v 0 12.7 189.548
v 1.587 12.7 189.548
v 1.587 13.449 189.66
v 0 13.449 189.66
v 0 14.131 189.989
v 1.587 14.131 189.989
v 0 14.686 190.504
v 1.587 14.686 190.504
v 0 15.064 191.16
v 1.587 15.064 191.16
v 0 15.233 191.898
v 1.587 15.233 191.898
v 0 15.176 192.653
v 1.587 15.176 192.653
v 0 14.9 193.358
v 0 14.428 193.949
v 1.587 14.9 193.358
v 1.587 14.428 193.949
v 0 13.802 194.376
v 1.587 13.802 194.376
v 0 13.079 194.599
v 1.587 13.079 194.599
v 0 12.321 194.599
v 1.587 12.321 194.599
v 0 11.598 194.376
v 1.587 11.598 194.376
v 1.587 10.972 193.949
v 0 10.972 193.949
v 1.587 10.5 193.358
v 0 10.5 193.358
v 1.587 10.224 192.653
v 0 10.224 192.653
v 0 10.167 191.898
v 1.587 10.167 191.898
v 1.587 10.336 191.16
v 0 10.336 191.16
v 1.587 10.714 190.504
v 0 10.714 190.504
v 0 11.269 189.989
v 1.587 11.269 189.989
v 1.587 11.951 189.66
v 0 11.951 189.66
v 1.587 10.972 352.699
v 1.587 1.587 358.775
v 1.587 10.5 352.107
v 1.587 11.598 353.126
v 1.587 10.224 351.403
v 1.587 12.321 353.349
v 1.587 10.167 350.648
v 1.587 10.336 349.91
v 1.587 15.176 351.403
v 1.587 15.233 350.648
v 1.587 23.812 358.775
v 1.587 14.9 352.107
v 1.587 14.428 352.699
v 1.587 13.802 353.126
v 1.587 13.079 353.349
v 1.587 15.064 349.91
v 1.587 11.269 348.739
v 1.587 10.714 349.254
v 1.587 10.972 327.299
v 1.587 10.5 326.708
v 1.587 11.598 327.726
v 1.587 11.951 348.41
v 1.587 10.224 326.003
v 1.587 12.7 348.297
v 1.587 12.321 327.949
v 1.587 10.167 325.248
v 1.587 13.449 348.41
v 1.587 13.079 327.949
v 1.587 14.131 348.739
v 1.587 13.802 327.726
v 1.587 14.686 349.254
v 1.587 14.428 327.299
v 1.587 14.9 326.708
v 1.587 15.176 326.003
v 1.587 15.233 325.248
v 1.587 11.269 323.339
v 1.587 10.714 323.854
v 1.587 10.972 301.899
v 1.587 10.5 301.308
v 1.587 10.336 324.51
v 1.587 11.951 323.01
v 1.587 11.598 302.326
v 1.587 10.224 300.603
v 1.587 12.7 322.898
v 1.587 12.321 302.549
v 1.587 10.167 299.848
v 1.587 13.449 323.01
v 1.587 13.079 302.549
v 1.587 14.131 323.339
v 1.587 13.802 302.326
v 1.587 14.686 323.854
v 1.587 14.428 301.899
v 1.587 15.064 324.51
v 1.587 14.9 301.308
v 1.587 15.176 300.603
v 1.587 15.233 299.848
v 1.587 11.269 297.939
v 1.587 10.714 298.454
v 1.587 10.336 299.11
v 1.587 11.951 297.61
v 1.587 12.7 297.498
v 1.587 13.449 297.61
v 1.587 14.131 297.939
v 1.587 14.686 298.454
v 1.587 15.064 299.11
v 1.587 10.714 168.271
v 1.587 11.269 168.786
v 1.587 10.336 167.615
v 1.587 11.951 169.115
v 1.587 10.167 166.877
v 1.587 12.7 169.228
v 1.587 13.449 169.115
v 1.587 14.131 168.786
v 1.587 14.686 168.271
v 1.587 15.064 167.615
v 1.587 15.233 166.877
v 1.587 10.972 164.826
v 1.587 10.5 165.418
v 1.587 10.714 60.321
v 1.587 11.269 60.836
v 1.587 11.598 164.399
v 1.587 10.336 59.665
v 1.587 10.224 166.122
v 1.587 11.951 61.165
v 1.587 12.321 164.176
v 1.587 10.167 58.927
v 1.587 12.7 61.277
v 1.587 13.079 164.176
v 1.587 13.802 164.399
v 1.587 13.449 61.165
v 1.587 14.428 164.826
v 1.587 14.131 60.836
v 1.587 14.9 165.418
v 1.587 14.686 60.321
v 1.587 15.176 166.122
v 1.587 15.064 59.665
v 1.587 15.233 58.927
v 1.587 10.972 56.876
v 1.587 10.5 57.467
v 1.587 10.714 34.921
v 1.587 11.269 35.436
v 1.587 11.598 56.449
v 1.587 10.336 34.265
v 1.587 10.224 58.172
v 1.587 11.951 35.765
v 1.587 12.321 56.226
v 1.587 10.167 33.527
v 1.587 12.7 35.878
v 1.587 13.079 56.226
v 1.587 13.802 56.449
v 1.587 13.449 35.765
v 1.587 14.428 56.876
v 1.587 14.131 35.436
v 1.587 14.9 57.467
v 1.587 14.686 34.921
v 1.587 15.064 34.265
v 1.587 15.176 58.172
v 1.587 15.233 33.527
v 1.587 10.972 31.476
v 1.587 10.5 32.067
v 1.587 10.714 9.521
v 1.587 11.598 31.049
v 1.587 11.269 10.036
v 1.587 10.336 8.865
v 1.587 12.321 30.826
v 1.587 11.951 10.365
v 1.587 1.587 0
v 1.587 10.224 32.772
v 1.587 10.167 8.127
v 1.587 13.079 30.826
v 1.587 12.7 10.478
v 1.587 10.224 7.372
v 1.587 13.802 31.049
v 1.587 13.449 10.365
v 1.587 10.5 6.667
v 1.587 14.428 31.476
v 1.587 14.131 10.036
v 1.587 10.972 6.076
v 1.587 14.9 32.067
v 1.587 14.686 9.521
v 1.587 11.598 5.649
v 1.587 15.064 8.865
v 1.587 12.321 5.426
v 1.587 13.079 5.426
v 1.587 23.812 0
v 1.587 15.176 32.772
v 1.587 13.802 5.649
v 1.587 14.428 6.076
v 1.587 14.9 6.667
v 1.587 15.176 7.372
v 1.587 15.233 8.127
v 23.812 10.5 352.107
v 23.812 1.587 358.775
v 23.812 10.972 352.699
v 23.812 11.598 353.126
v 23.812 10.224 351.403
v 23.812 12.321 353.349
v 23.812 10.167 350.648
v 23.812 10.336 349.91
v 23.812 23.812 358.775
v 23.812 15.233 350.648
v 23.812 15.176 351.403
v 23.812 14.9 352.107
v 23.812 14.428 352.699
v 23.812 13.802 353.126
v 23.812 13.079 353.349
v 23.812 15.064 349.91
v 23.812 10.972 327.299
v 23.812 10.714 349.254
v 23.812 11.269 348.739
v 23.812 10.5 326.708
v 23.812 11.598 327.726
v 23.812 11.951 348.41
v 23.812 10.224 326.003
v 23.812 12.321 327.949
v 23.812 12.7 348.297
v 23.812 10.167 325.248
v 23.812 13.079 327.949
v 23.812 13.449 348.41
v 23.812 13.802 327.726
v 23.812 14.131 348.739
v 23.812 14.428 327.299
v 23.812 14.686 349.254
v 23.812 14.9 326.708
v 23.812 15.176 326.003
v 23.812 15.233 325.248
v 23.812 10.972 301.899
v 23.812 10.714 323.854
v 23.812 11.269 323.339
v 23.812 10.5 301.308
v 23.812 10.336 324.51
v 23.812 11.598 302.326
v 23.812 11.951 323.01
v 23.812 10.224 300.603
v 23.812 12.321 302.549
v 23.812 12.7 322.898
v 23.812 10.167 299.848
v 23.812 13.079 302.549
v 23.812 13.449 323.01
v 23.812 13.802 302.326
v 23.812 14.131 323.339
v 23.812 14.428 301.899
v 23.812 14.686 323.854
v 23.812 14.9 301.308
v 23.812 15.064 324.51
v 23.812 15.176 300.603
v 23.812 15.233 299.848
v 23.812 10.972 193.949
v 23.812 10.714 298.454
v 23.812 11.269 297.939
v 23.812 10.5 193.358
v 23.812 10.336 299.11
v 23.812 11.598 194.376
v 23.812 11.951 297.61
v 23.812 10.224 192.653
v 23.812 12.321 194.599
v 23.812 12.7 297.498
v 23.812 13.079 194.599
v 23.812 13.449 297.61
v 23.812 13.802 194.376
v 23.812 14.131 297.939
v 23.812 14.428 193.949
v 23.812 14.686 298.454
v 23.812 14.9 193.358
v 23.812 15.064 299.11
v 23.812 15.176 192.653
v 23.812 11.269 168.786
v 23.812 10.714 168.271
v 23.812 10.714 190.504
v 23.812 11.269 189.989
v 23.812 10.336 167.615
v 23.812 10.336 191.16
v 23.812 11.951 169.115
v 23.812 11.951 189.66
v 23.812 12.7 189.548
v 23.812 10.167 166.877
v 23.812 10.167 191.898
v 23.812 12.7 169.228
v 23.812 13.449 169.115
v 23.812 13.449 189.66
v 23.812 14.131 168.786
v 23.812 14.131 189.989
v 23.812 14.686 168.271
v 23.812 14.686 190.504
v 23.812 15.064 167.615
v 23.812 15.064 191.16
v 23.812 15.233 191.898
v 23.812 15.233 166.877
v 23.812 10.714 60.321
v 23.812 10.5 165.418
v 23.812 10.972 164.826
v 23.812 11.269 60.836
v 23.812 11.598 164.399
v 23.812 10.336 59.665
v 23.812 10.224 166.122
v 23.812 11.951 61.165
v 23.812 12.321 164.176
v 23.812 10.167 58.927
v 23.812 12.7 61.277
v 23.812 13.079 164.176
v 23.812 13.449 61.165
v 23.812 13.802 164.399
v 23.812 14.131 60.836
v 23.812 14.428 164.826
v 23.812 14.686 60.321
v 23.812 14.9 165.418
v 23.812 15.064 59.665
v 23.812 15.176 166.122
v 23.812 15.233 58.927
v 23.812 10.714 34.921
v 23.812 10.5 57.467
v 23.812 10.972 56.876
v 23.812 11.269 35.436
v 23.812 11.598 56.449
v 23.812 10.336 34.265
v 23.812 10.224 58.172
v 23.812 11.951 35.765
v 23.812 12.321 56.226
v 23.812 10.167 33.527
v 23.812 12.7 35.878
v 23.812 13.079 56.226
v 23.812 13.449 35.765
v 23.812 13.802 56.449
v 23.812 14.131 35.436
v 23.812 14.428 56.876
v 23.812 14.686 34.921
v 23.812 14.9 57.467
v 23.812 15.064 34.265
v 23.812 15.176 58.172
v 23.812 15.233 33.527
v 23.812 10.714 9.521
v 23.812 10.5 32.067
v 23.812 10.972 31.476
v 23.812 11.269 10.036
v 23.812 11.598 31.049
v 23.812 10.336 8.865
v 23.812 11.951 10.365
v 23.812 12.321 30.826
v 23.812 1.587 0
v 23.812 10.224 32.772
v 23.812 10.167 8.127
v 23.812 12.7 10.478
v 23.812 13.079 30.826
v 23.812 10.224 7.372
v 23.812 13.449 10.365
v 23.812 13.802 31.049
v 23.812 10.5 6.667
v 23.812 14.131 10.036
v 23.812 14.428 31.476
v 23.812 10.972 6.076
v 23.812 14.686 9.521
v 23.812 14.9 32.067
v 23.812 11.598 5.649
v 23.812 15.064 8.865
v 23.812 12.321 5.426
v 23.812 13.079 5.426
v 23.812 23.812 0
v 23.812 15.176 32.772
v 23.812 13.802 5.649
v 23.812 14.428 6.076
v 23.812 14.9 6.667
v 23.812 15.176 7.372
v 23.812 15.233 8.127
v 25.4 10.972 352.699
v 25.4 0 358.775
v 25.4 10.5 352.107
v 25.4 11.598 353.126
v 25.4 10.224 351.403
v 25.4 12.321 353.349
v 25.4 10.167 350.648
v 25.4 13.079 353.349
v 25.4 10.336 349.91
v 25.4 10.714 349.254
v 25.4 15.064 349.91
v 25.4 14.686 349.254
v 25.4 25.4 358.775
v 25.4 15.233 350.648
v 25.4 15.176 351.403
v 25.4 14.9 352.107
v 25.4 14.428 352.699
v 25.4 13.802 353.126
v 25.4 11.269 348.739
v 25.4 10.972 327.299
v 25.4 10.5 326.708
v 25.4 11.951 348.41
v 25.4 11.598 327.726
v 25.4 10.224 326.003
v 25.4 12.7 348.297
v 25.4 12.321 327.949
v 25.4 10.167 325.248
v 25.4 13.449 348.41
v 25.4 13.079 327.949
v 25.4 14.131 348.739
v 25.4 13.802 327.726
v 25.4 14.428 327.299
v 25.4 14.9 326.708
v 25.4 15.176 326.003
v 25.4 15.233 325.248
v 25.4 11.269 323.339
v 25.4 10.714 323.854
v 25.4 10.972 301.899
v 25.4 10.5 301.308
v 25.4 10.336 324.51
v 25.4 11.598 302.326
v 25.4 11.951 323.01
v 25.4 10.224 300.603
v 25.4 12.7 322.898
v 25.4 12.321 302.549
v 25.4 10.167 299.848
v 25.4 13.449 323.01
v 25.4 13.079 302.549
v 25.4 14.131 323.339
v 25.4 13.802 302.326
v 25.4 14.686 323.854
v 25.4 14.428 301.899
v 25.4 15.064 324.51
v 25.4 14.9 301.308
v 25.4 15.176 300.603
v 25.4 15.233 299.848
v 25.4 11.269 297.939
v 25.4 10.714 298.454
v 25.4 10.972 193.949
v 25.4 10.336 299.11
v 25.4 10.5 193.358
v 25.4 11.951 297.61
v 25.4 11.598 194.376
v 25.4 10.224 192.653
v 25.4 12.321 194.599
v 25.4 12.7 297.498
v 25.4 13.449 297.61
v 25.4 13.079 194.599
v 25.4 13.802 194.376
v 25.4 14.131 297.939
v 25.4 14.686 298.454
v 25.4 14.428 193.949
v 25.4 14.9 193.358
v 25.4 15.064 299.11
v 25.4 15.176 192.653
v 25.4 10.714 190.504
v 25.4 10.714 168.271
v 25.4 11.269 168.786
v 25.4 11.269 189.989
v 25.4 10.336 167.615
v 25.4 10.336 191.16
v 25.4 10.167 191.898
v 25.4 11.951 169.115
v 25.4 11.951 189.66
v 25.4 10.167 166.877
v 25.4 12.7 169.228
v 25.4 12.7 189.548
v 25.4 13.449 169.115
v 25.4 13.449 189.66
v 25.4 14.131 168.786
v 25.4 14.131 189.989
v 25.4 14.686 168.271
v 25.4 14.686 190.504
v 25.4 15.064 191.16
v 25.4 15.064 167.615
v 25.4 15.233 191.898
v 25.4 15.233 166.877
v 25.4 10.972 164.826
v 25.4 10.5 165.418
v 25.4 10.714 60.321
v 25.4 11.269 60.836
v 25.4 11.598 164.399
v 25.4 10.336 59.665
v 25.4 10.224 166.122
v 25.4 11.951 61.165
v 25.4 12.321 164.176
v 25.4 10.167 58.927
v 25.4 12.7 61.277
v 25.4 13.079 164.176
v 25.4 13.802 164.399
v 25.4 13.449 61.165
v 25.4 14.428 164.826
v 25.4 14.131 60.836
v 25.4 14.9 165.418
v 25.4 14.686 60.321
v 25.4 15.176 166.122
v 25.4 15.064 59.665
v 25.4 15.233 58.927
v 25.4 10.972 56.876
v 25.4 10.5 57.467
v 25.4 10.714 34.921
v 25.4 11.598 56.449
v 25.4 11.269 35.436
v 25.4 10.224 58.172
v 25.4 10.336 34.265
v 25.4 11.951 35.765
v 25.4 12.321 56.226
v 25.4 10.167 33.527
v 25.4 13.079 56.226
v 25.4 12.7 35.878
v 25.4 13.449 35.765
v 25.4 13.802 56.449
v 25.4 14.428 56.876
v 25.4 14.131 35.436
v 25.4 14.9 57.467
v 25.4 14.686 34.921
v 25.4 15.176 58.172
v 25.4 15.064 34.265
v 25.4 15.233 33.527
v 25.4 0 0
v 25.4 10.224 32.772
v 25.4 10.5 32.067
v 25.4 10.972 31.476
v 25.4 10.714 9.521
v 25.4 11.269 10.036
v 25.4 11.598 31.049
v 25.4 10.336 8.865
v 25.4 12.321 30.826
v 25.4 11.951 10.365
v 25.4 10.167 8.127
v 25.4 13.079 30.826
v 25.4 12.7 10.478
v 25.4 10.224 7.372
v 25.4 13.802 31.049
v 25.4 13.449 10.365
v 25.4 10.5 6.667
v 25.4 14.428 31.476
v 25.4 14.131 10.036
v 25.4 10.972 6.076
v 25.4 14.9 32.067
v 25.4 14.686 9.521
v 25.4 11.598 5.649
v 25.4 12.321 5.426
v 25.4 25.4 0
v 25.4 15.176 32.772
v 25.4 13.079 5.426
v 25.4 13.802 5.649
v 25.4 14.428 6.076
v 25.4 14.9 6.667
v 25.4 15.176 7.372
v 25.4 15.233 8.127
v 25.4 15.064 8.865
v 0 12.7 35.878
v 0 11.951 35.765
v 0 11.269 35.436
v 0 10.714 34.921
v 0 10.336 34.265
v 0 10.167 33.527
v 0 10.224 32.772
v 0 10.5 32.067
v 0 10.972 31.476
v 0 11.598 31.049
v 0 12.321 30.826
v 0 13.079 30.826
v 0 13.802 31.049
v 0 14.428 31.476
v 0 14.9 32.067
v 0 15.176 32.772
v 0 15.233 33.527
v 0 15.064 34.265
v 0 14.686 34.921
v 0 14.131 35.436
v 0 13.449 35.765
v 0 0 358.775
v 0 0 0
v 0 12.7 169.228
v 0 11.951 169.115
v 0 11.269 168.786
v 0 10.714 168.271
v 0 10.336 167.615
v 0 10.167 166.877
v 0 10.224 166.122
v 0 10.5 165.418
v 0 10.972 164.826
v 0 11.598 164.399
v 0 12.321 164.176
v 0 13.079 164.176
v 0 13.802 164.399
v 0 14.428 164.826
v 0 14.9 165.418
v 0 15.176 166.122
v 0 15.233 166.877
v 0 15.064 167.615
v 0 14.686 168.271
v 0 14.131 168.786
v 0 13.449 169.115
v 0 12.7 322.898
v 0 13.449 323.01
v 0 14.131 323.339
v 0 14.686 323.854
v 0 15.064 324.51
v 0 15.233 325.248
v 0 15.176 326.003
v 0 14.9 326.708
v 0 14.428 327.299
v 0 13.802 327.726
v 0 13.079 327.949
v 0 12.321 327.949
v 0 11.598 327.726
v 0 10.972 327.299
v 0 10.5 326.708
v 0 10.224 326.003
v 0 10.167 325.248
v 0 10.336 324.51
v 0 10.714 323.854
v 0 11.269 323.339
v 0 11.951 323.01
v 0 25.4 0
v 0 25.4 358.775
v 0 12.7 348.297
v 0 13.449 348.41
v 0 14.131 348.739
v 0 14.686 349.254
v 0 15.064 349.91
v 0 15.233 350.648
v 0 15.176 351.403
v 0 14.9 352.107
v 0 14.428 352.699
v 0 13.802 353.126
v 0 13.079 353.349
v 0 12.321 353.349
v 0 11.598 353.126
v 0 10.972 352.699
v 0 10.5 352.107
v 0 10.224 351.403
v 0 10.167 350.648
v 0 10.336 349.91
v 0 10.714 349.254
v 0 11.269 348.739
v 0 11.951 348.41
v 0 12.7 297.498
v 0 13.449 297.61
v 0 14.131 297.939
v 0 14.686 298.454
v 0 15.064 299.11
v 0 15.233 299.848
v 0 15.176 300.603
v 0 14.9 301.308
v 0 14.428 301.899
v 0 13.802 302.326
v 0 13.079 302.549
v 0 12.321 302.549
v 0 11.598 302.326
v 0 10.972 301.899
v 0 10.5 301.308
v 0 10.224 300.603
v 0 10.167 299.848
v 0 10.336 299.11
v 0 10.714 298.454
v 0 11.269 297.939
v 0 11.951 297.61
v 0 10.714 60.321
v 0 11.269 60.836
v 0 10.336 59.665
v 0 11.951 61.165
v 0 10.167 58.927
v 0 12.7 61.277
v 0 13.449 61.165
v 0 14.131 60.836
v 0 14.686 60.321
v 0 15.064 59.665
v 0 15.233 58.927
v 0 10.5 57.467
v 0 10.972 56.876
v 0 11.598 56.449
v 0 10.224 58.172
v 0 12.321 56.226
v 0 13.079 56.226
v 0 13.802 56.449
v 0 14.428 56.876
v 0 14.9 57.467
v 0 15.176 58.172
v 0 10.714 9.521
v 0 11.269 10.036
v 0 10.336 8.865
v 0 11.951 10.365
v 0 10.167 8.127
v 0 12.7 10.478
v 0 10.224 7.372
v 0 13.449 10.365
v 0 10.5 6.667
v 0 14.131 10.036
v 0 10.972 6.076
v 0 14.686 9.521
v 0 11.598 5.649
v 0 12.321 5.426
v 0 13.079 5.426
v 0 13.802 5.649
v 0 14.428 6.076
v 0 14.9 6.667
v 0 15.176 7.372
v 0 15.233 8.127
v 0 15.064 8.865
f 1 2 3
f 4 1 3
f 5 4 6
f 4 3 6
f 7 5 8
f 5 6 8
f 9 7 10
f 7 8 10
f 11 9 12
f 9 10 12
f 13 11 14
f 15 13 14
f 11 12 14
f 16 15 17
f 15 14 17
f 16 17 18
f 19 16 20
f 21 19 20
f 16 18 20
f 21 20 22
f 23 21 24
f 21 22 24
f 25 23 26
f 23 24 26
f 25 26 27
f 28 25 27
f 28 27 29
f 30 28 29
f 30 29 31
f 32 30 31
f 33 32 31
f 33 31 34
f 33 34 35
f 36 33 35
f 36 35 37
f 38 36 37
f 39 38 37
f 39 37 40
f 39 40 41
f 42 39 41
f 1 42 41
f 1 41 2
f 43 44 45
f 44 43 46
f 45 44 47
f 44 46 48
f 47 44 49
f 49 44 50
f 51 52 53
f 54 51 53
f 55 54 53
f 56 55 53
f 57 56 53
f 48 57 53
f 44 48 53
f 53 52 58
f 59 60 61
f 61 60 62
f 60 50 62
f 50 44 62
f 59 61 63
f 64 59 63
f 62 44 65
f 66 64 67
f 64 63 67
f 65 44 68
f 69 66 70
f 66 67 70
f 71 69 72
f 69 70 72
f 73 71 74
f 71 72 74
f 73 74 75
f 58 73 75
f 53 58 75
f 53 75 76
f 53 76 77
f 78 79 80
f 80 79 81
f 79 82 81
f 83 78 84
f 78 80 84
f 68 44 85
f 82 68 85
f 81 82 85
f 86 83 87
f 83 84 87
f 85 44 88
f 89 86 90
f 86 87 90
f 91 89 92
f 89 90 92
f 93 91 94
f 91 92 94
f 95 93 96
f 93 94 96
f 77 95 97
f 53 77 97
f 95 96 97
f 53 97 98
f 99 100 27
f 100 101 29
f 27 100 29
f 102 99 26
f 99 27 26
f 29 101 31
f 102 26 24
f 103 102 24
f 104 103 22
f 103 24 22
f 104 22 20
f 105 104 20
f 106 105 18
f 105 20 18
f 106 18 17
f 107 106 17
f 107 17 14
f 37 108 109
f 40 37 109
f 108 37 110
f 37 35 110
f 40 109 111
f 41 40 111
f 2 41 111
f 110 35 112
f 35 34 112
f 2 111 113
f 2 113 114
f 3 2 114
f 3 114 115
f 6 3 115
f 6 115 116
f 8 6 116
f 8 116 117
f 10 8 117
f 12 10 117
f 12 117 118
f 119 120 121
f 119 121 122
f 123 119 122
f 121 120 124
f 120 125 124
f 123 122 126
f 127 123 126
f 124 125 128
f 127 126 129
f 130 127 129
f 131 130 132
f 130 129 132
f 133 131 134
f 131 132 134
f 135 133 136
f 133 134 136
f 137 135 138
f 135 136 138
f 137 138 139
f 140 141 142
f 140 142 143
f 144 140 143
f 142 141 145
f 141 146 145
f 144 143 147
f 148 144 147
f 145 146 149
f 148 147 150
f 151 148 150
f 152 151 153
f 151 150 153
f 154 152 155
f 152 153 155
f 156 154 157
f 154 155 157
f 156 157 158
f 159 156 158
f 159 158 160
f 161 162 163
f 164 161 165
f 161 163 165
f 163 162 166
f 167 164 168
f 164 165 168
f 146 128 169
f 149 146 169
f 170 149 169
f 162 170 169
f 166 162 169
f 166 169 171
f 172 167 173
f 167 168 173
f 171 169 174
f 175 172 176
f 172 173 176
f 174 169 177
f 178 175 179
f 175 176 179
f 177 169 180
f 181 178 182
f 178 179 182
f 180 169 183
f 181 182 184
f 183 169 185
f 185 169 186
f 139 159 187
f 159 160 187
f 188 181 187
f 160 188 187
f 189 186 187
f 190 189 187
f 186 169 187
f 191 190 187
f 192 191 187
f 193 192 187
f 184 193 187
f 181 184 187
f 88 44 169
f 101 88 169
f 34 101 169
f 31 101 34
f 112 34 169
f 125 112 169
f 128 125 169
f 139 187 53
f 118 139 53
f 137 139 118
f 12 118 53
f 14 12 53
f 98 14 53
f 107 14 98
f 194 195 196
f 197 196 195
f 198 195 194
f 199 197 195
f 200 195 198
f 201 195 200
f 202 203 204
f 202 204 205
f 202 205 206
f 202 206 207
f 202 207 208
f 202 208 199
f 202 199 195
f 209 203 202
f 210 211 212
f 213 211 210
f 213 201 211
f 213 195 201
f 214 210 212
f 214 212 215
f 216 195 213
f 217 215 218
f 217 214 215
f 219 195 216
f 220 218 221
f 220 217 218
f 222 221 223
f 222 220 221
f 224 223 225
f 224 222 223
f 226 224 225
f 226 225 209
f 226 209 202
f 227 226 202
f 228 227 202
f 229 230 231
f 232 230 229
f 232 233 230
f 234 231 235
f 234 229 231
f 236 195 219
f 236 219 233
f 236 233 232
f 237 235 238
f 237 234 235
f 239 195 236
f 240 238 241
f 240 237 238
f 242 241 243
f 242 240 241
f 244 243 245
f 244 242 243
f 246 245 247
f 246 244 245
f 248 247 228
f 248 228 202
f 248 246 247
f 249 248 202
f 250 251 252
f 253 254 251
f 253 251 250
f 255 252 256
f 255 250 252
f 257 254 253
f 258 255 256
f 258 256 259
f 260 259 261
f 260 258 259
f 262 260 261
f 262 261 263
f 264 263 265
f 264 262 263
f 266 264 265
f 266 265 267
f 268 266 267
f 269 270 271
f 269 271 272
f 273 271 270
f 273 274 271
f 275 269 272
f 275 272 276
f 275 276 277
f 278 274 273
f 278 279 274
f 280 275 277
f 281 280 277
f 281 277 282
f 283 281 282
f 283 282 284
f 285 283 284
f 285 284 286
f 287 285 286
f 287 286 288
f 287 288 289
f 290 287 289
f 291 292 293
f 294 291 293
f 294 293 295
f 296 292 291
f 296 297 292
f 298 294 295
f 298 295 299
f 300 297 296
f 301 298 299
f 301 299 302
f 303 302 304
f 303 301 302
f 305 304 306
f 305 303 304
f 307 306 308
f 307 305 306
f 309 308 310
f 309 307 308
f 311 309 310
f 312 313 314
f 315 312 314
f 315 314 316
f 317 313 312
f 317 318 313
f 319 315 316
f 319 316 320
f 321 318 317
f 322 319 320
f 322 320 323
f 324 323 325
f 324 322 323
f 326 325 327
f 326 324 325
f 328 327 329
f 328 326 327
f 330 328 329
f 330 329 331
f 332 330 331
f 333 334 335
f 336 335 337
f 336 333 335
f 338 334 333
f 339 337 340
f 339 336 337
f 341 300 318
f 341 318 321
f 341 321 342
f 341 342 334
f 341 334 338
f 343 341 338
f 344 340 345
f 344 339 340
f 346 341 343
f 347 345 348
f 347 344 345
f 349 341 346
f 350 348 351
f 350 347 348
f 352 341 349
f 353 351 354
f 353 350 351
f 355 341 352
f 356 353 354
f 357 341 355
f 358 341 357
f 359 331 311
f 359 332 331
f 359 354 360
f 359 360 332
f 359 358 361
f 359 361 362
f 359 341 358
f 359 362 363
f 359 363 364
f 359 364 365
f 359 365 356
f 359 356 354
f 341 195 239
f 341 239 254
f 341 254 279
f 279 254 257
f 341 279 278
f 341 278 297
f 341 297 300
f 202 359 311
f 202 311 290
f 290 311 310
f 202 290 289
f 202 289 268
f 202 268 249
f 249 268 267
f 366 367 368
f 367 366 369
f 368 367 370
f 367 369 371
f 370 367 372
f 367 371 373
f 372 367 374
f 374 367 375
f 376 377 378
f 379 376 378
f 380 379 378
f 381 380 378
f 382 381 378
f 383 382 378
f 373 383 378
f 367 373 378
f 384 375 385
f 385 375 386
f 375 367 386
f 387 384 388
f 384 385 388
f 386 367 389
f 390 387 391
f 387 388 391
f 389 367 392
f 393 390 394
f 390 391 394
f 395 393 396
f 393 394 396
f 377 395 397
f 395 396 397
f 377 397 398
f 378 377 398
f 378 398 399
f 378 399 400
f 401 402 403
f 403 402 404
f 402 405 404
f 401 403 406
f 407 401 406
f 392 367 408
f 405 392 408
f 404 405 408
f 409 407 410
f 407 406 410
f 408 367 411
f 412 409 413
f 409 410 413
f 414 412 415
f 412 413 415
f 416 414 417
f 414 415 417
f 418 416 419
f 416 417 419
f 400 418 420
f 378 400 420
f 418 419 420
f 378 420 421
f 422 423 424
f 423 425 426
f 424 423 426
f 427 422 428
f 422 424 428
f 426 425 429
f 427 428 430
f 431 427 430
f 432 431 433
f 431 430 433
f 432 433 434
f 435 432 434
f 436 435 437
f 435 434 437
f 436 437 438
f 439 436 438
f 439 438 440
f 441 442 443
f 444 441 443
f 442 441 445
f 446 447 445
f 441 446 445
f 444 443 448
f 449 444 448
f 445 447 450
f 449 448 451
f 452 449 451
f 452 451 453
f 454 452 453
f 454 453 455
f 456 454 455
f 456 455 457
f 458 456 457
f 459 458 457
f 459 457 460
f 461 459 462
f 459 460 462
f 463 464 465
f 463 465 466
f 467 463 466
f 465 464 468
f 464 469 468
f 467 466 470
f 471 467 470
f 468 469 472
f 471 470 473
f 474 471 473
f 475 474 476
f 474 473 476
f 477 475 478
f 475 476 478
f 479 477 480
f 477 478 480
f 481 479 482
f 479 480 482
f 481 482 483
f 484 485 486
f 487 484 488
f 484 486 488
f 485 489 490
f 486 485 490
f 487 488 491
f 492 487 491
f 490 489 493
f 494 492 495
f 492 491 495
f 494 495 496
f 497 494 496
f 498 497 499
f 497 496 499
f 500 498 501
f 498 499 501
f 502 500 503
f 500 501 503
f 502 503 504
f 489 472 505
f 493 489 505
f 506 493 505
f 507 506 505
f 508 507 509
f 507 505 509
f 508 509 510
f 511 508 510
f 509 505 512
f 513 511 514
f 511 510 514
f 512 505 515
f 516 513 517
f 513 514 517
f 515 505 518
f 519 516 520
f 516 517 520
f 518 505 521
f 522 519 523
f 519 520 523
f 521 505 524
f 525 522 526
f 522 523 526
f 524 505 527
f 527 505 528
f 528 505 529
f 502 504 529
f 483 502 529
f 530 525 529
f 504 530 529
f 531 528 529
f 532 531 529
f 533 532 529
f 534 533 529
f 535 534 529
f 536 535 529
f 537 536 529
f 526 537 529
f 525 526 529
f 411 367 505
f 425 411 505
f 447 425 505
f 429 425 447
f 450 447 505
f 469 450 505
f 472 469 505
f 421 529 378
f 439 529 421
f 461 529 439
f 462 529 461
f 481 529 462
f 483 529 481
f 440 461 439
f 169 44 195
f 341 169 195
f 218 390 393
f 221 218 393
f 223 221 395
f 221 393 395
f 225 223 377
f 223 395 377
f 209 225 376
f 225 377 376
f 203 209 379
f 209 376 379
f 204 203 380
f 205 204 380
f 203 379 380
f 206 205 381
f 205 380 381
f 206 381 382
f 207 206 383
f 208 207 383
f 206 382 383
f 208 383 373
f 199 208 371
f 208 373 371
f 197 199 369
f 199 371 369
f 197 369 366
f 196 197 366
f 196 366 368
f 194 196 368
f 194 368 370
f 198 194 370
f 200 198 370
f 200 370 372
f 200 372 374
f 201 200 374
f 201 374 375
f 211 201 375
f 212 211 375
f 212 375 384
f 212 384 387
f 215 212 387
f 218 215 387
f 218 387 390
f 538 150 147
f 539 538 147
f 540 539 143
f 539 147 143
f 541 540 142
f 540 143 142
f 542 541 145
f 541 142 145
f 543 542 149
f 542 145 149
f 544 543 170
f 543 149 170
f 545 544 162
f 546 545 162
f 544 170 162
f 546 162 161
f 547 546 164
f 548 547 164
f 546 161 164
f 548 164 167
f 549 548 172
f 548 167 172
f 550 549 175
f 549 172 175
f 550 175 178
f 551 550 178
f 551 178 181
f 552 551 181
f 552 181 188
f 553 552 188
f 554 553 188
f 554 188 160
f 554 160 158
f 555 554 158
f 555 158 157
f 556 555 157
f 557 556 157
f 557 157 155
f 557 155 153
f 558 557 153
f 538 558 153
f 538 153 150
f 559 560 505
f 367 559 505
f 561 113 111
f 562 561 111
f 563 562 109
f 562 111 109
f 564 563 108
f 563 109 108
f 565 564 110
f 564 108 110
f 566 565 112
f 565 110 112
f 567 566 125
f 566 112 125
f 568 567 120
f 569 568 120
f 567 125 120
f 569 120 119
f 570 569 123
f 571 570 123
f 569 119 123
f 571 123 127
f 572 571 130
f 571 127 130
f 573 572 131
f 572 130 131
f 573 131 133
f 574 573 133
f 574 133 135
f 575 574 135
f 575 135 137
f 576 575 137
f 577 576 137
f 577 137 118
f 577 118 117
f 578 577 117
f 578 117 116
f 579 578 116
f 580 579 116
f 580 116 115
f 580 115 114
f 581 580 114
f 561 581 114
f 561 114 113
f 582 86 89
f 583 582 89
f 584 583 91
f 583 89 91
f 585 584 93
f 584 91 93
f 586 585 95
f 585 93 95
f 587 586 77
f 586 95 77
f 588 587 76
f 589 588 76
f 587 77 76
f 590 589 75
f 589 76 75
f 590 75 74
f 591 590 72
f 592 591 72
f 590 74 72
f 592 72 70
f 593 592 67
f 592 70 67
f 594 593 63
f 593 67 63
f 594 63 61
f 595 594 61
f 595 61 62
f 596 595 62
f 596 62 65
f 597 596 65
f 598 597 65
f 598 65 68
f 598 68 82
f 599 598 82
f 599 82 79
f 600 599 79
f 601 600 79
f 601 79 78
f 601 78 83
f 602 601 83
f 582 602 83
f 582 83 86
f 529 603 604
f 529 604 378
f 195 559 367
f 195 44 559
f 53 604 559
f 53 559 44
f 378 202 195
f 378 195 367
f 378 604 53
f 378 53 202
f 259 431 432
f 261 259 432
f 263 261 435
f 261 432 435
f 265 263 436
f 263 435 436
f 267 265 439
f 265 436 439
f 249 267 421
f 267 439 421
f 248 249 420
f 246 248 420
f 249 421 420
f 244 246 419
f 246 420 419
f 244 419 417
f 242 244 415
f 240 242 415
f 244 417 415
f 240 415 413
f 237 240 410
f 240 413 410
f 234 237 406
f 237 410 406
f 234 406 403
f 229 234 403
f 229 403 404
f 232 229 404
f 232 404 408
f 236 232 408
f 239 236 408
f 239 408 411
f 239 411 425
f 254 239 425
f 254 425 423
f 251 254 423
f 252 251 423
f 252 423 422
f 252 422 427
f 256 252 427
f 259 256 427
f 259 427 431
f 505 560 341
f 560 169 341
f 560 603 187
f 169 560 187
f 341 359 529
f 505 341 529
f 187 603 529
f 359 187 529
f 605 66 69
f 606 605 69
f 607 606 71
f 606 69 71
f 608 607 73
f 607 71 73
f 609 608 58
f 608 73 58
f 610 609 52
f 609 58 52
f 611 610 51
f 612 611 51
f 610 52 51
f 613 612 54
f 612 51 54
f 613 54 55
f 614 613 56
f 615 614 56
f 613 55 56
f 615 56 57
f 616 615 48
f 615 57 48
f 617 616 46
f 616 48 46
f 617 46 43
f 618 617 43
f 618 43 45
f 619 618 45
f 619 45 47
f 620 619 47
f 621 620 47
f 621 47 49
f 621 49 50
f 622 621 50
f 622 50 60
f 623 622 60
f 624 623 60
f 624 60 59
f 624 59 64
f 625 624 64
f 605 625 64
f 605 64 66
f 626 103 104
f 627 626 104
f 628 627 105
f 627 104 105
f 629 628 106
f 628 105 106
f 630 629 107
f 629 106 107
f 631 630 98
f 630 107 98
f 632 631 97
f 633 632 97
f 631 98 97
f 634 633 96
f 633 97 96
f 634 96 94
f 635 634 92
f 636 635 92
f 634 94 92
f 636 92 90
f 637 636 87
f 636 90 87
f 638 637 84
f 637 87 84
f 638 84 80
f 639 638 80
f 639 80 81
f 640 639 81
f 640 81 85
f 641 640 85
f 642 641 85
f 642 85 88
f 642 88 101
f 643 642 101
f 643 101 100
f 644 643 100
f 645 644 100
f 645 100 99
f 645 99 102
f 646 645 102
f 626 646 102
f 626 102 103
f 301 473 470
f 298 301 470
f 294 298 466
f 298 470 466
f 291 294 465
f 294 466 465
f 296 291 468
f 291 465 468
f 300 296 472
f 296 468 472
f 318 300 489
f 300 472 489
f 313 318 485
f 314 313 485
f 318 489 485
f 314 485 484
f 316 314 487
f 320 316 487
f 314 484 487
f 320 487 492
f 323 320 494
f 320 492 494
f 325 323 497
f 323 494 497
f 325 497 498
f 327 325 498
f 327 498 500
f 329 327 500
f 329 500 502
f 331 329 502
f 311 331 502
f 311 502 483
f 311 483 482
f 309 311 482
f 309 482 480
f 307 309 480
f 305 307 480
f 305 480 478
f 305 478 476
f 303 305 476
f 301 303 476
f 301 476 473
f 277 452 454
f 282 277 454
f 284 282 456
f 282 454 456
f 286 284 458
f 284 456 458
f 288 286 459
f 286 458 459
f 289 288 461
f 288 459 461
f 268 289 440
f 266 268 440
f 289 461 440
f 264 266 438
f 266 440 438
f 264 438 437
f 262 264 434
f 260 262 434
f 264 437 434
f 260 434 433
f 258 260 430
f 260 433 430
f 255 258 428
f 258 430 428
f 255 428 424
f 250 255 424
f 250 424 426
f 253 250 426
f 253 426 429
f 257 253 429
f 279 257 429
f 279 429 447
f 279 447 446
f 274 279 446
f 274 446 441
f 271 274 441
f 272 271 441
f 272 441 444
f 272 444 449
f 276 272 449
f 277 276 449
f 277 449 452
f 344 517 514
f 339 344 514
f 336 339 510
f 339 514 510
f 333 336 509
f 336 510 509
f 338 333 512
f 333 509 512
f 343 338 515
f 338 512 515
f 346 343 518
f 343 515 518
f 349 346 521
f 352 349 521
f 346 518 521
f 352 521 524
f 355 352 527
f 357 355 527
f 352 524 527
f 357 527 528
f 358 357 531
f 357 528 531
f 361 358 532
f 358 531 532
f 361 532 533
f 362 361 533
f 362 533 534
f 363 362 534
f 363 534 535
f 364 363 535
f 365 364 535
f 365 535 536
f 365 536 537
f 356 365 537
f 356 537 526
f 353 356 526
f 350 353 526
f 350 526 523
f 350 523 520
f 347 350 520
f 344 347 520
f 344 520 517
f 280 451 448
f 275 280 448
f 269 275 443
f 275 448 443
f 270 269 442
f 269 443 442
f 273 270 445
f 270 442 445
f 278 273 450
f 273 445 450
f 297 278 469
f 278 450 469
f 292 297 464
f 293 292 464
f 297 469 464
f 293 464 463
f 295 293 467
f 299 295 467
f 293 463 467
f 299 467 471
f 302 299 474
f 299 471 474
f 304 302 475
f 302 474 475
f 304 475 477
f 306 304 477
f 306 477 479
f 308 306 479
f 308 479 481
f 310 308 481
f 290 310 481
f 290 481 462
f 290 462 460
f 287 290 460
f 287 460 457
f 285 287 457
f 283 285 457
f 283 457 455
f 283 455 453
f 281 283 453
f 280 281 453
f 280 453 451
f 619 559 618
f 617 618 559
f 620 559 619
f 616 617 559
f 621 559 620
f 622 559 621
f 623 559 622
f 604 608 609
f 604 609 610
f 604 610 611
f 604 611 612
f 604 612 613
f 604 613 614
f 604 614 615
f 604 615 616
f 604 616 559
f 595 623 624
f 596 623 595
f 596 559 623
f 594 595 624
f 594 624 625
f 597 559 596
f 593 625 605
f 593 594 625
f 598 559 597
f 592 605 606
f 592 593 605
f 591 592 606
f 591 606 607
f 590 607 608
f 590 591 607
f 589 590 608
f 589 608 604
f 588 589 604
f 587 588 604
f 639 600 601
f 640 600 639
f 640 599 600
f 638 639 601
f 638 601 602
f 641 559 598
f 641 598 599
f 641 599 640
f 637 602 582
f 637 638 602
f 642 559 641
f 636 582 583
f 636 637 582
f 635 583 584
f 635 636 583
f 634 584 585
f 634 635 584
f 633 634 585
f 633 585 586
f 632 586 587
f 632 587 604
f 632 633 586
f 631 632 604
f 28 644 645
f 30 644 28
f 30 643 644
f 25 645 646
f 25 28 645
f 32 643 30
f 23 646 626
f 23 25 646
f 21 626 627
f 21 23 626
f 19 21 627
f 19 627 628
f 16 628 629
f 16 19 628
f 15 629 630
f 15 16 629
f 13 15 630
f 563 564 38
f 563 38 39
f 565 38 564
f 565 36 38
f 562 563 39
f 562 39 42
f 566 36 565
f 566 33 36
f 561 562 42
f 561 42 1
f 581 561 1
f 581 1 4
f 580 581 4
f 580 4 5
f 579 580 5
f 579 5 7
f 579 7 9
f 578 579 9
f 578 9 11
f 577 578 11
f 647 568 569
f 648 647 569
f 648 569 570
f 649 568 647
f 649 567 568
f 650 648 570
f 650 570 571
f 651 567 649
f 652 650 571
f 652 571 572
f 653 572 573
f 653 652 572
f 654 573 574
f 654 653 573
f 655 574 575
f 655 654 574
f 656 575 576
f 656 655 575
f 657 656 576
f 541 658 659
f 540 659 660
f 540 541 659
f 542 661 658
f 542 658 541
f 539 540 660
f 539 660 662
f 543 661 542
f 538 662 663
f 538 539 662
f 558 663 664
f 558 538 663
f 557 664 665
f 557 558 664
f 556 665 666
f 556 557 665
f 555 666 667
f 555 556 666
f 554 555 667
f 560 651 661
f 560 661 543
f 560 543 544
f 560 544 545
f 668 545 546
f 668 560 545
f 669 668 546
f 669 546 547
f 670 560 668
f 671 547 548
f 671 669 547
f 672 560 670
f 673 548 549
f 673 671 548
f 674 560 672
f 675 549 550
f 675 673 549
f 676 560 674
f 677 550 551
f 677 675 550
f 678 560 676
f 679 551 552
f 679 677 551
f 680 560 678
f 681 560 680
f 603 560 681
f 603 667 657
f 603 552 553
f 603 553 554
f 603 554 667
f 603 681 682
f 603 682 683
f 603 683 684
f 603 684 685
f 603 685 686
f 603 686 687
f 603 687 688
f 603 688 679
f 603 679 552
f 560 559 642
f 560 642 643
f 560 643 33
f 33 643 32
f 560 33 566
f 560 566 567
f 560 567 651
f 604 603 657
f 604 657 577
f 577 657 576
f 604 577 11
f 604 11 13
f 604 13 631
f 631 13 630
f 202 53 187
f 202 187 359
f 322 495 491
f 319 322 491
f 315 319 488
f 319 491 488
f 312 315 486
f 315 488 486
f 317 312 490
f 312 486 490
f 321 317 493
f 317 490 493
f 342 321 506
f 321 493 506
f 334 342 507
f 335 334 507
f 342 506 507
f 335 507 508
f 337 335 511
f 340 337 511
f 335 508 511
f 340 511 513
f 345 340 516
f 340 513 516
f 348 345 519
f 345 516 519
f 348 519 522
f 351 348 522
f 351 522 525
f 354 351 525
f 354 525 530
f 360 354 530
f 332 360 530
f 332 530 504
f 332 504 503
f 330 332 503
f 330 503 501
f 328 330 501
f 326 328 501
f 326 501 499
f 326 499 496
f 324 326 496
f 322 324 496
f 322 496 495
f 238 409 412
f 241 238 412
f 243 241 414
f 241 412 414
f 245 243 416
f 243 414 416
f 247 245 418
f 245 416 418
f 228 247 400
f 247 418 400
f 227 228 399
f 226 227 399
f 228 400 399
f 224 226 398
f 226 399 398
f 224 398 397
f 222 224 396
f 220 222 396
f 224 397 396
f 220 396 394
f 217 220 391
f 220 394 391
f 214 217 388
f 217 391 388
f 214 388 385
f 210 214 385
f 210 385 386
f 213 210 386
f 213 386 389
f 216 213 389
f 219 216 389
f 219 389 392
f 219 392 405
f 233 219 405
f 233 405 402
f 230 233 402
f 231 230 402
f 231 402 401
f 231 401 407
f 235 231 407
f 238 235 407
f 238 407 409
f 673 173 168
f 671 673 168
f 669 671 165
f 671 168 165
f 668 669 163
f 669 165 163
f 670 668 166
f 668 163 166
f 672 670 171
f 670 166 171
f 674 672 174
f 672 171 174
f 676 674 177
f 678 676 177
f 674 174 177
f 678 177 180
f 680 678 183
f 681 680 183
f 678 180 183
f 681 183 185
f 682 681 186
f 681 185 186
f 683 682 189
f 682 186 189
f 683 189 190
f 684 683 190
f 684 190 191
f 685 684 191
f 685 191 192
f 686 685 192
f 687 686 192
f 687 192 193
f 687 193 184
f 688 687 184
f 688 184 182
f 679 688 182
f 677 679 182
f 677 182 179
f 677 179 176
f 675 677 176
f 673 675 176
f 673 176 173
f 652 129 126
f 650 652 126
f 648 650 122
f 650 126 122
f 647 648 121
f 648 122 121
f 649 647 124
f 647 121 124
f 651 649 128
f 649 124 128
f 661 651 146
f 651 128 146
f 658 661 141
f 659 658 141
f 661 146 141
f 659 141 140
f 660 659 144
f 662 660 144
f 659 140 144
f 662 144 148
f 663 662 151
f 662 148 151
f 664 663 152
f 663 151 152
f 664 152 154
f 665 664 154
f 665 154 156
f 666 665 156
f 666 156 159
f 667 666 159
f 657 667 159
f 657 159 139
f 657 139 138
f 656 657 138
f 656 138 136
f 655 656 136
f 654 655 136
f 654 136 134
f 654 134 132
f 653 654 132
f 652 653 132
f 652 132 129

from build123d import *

# Parameters (mm, degrees)
SKETCH1_W           = 25.4
SKETCH1_H           = 25.4
SKETCH1_W_2         = 22.225
SKETCH1_H_2         = 22.225
BOSS_EXTRUDE1_DEPTH = 358.775
SKETCH4_R           = 2.54
CUT_EXTRUDE3_DEPTH  = 361.568746046


with BuildPart() as part:
    # Sketch1 → Boss-Extrude1 (new body)
    with BuildSketch(Plane.XY):
        with Locations((12.7, 12.7)):
            Rectangle(SKETCH1_W, SKETCH1_H)
        with Locations((12.7, 12.7)):
            Rectangle(SKETCH1_W_2, SKETCH1_H_2, mode=Mode.SUBTRACT)
    extrude(amount=BOSS_EXTRUDE1_DEPTH)

    # Sketch4 → Cut-Extrude3 (cut, through all)
    with BuildSketch(Plane(origin=(25.4, 0, 0), x_dir=(0, 0, -1), z_dir=(1, 0, 0))):
        with Locations((-350.8375, 12.7)):
            Circle(SKETCH4_R)
        with Locations((-325.4375, 12.7)):
            Circle(SKETCH4_R)
        with Locations((-300.0375, 12.7)):
            Circle(SKETCH4_R)
        with Locations(Location((-58.7375, 12.7, 0), (0, 0, 180))):
            Circle(SKETCH4_R)
        with Locations(Location((-33.3375, 12.7, 0), (0, 0, 180))):
            Circle(SKETCH4_R)
        with Locations(Location((-7.9375, 12.7, 0), (0, 0, 180))):
            Circle(SKETCH4_R)
        with Locations((-192.0875, 12.7)):
            Circle(SKETCH4_R)
        with Locations(Location((-166.6875, 12.7, 0), (0, 0, 180))):
            Circle(SKETCH4_R)
    extrude(amount=-CUT_EXTRUDE3_DEPTH, mode=Mode.SUBTRACT)


solid = part.part
